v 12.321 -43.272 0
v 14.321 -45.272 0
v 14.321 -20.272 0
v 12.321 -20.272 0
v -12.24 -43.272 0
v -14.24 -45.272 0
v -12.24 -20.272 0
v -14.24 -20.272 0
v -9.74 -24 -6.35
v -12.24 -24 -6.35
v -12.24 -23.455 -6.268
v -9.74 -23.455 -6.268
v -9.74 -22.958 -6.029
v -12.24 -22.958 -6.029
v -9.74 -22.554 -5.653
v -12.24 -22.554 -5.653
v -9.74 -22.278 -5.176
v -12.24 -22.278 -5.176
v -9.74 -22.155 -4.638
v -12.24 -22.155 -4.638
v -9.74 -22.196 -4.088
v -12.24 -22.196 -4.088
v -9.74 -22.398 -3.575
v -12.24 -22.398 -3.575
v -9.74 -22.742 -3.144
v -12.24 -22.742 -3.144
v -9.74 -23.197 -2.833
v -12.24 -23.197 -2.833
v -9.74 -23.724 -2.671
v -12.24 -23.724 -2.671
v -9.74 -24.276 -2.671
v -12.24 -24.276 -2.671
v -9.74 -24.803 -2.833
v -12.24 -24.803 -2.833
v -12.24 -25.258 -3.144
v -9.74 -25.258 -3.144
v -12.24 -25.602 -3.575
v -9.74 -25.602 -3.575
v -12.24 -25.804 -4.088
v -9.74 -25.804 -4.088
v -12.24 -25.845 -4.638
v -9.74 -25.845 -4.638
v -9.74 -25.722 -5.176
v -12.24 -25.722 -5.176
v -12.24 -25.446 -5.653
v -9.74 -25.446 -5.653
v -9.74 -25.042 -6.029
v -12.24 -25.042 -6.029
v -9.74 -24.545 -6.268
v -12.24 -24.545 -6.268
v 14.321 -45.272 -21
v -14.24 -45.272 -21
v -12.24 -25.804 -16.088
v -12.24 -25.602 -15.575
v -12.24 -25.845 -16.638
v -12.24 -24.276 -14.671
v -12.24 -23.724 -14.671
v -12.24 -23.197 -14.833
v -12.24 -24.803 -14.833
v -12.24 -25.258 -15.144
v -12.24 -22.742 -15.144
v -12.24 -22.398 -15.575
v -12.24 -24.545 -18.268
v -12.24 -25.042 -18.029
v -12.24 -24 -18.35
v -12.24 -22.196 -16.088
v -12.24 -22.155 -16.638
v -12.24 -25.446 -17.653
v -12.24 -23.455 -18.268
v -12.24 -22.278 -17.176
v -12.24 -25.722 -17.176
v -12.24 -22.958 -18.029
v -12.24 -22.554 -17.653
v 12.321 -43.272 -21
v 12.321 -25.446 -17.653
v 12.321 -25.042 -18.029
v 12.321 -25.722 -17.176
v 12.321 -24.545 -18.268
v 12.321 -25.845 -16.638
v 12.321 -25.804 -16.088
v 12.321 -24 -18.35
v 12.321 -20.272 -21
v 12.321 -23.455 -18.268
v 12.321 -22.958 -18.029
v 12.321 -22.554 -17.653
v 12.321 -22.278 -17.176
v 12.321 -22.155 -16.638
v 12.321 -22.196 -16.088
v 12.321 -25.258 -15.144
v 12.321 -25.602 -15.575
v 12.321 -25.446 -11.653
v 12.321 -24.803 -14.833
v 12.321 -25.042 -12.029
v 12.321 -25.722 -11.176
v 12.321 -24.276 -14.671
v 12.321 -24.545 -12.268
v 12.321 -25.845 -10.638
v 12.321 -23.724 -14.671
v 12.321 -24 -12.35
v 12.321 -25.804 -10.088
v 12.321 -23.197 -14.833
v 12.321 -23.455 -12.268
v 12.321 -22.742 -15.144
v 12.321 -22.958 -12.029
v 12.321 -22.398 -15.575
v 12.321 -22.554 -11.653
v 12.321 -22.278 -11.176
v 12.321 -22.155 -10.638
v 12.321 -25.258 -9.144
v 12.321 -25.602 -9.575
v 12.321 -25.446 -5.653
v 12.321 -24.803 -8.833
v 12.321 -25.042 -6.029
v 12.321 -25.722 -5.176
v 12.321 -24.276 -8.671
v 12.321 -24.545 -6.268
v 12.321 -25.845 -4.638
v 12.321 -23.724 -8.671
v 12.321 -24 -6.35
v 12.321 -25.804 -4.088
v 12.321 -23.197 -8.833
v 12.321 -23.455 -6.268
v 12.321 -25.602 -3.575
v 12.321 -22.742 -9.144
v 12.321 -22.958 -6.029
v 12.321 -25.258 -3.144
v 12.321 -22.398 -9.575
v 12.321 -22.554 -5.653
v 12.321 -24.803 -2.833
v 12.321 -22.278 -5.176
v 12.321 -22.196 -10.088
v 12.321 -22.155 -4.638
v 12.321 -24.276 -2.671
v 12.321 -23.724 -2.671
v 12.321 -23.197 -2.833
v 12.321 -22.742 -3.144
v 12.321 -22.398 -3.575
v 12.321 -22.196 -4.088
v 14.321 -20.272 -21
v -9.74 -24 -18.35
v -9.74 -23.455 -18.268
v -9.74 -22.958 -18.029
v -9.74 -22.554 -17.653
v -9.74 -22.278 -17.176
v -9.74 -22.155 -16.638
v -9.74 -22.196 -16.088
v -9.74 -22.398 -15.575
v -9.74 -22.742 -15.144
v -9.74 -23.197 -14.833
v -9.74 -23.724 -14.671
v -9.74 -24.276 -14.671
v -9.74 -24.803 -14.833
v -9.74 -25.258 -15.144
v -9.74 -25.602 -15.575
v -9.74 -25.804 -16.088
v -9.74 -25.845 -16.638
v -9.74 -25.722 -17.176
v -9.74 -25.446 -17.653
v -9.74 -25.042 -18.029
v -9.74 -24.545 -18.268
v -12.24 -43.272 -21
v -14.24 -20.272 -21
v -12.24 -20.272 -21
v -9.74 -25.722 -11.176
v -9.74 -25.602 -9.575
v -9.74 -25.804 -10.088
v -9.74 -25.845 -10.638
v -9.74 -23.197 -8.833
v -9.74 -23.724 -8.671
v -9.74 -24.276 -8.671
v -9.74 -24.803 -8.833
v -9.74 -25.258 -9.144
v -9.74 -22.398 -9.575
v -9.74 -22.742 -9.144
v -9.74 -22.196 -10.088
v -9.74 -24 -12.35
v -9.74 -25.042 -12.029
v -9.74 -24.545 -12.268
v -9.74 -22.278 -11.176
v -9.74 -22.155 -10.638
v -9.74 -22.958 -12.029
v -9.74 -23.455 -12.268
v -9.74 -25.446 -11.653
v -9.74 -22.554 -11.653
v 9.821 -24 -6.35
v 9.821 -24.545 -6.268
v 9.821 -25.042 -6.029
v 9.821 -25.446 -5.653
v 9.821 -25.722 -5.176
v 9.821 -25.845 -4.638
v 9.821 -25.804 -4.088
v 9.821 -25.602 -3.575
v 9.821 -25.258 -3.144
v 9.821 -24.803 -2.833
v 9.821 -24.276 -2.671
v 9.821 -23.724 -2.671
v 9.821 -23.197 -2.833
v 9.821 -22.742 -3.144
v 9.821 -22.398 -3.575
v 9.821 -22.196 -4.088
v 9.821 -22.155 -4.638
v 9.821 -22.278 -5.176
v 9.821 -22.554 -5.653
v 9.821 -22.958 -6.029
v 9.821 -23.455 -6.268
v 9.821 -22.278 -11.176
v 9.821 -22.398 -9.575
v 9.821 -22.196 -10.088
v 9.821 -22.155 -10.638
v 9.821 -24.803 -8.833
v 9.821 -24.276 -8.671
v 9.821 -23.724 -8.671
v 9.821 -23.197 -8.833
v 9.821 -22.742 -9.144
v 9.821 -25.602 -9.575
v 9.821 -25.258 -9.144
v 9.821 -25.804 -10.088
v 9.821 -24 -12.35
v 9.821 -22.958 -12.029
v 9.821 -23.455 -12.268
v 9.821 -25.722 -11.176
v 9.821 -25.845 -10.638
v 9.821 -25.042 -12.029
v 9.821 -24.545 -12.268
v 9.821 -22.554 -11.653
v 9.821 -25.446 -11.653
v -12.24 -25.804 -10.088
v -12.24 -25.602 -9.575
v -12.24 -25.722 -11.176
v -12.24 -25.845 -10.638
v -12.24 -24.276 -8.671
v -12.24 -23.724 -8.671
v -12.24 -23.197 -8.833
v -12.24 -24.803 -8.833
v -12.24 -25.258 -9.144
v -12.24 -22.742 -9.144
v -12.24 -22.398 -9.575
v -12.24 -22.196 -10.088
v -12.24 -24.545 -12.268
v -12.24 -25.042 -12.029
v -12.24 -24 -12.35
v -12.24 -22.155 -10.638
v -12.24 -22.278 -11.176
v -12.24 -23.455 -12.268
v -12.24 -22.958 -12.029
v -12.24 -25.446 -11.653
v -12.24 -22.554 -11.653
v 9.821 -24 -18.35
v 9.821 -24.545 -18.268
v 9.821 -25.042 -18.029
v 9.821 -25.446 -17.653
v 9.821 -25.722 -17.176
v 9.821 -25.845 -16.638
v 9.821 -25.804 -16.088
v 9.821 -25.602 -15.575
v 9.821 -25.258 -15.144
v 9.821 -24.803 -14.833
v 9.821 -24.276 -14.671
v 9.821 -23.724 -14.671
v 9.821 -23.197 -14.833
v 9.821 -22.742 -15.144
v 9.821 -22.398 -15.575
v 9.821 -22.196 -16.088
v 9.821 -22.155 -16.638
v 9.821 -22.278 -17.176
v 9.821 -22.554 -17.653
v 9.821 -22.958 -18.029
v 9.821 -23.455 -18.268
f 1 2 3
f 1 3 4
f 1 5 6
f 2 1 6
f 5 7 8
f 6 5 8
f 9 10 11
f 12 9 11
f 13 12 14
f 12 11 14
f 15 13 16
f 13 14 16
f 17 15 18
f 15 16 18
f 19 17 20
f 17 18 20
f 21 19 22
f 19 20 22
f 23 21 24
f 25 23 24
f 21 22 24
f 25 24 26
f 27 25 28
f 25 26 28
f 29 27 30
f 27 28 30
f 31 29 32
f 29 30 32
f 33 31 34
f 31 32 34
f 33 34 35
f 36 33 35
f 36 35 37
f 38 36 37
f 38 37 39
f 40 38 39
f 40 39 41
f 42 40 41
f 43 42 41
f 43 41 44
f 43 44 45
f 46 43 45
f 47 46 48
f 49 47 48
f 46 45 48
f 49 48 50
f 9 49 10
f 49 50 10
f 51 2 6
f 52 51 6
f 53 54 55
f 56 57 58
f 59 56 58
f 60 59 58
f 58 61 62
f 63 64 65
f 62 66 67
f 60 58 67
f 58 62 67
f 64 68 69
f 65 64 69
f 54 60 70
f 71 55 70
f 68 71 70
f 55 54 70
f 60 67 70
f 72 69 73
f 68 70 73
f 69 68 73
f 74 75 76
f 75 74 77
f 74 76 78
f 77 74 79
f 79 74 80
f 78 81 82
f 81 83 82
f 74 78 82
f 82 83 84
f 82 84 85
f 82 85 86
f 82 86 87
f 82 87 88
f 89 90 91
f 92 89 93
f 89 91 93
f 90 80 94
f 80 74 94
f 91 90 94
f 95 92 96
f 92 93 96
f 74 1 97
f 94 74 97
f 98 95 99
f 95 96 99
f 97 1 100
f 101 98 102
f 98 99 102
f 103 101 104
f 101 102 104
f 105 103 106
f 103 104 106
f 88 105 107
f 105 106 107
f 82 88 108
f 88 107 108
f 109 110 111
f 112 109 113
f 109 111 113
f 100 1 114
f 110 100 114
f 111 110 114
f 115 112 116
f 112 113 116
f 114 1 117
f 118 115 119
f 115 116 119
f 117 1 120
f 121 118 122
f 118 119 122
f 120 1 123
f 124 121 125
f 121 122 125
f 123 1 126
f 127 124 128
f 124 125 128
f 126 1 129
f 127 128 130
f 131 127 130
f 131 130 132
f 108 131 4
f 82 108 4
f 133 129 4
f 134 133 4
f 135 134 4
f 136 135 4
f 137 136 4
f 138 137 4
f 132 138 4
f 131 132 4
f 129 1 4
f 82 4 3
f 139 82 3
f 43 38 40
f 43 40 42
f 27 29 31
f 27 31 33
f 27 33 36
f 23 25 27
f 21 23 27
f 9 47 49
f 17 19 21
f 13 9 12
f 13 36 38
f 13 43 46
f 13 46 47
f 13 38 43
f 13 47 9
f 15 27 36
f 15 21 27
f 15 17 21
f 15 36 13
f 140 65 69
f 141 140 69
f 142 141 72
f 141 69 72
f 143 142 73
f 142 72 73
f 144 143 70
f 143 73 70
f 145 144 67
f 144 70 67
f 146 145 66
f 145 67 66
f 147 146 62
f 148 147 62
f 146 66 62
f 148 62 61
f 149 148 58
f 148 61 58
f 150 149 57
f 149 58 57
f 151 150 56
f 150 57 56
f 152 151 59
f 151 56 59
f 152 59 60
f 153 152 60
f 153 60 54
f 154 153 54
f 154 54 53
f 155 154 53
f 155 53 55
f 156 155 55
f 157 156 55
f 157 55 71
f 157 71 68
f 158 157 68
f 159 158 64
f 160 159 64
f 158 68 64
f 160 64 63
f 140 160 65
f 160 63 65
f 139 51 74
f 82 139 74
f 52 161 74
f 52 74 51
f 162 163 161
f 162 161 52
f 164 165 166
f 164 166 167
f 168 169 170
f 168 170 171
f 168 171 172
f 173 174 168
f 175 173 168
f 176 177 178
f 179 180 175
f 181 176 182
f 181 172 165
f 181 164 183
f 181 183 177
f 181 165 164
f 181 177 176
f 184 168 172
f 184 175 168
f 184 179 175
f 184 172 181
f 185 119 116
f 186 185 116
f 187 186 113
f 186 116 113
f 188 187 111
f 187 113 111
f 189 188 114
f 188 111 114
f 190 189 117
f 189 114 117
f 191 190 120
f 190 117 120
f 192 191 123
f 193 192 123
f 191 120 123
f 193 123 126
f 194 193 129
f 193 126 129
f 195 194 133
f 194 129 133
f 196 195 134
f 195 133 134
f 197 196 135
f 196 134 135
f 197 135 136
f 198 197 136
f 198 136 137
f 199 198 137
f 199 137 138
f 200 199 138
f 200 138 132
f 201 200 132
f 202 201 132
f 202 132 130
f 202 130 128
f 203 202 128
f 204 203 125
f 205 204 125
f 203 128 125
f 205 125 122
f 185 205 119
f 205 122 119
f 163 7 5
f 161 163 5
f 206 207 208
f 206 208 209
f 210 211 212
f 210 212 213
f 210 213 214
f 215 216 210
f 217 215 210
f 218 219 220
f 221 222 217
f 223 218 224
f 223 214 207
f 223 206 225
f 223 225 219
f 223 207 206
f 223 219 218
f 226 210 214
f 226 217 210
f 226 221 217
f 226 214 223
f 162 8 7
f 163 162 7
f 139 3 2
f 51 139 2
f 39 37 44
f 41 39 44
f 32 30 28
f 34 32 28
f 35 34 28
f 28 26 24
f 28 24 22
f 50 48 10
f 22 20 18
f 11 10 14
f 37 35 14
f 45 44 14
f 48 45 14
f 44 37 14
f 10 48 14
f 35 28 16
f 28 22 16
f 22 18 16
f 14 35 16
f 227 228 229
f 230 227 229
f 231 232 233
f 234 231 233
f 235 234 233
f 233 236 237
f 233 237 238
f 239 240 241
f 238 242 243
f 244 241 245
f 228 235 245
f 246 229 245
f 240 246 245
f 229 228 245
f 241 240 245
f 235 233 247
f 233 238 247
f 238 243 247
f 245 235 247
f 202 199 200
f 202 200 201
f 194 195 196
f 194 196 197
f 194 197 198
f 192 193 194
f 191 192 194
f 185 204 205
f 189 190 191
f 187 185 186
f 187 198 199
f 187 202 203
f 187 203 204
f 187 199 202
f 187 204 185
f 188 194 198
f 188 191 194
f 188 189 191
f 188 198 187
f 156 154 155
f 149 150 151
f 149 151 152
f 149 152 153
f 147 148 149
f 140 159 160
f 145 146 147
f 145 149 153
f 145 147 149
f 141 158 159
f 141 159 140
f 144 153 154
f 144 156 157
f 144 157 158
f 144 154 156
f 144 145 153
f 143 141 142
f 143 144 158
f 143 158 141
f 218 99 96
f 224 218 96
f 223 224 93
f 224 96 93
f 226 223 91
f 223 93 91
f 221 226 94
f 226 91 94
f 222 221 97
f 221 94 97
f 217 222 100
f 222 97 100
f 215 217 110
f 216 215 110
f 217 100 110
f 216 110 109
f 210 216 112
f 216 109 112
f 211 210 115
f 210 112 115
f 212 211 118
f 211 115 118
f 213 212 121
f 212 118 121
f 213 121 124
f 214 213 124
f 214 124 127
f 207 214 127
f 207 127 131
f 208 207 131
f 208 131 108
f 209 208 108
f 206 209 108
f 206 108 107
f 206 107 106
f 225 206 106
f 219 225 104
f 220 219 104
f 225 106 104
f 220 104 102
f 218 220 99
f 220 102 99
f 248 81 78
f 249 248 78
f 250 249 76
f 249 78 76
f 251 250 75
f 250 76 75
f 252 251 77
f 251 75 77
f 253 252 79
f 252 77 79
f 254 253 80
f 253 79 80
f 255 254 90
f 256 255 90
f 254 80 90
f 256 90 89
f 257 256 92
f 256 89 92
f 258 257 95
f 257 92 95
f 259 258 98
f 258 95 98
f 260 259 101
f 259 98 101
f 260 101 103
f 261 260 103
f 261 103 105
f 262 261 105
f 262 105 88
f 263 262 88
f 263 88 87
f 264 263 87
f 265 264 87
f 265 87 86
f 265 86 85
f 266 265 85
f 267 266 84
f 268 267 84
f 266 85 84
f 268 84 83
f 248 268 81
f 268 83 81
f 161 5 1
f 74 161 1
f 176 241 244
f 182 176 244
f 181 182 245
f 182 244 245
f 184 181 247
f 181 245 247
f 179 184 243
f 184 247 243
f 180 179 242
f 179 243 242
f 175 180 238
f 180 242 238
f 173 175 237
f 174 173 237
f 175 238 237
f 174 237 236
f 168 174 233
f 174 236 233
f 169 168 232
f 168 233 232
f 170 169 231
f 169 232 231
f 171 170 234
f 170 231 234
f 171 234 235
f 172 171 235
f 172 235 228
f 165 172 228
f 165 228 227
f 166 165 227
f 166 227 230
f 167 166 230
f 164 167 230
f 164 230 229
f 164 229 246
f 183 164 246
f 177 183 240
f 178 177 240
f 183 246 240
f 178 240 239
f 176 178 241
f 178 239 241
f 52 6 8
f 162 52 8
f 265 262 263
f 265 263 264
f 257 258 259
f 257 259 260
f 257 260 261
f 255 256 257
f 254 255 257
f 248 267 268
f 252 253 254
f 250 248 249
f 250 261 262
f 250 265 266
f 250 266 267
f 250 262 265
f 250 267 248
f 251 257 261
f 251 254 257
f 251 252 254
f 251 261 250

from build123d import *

# Parameters (mm, degrees)
BOSS_EXTRUDE4_DEPTH   = 21
SKETCH5_R             = 1.85
BOSS_EXTRUDE5_DEPTH   = 2.5
BOSS_EXTRUDE5_2_DEPTH = 2.5
BOSS_EXTRUDE5_3_DEPTH = 2.5
SKETCH6_R             = 1.85
BOSS_EXTRUDE6_DEPTH   = 2.5


with BuildPart() as part:
    # Sketch1 → Boss-Extrude4 (new body)
    with BuildSketch(Plane.XY):
        Polygon((12.320696932, -20.271970514), (14.320696932, -20.271970514), (14.320696932, -45.271970514), (-14.239524115, -45.271970514), (-14.239524115, -20.271970514), (-12.239524115, -20.271970514), (-12.239524115, -43.271970514), (12.320696932, -43.271970514), align=None)
    extrude(amount=-BOSS_EXTRUDE4_DEPTH)

    # Sketch6 → Boss-Extrude6 (add)
    with BuildSketch(Plane(origin=(12.320696932, 0, -12.320696932), x_dir=(0, 0, 1), z_dir=(-1, 0, 0))):
        with Locations(Location((7.820696932, -24, 0), (0, 0, 180))):
            Circle(SKETCH6_R)
        with Locations(Location((1.820696932, -24, 0), (0, 0, 180))):
            Circle(SKETCH6_R)
        with Locations(Location((-4.179303068, -24, 0), (0, 0, 180))):
            Circle(SKETCH6_R)
    extrude(amount=BOSS_EXTRUDE6_DEPTH)


with BuildPart() as body_2:
    # Sketch5 → Boss-Extrude5 (new body)
    with BuildSketch(Plane(origin=(-12.239524115, 0, 0), x_dir=(0, 0, -1), z_dir=(1, 0, 0))):
        with Locations((16.5, -24)):
            Circle(SKETCH5_R)
    extrude(amount=BOSS_EXTRUDE5_DEPTH)


with BuildPart() as body_3:
    # Sketch5 → Boss-Extrude5 2 (new body)
    with BuildSketch(Plane(origin=(-12.239524115, 0, 0), x_dir=(0, 0, -1), z_dir=(1, 0, 0))):
        with Locations((10.5, -24)):
            Circle(SKETCH5_R)
    extrude(amount=BOSS_EXTRUDE5_2_DEPTH)


with BuildPart() as body_4:
    # Sketch5 → Boss-Extrude5 3 (new body)
    with BuildSketch(Plane(origin=(-12.239524115, 0, 0), x_dir=(0, 0, -1), z_dir=(1, 0, 0))):
        with Locations((4.5, -24)):
            Circle(SKETCH5_R)
    extrude(amount=BOSS_EXTRUDE5_3_DEPTH)


solid = Compound([part.part, body_2.part, body_3.part, body_4.part])
